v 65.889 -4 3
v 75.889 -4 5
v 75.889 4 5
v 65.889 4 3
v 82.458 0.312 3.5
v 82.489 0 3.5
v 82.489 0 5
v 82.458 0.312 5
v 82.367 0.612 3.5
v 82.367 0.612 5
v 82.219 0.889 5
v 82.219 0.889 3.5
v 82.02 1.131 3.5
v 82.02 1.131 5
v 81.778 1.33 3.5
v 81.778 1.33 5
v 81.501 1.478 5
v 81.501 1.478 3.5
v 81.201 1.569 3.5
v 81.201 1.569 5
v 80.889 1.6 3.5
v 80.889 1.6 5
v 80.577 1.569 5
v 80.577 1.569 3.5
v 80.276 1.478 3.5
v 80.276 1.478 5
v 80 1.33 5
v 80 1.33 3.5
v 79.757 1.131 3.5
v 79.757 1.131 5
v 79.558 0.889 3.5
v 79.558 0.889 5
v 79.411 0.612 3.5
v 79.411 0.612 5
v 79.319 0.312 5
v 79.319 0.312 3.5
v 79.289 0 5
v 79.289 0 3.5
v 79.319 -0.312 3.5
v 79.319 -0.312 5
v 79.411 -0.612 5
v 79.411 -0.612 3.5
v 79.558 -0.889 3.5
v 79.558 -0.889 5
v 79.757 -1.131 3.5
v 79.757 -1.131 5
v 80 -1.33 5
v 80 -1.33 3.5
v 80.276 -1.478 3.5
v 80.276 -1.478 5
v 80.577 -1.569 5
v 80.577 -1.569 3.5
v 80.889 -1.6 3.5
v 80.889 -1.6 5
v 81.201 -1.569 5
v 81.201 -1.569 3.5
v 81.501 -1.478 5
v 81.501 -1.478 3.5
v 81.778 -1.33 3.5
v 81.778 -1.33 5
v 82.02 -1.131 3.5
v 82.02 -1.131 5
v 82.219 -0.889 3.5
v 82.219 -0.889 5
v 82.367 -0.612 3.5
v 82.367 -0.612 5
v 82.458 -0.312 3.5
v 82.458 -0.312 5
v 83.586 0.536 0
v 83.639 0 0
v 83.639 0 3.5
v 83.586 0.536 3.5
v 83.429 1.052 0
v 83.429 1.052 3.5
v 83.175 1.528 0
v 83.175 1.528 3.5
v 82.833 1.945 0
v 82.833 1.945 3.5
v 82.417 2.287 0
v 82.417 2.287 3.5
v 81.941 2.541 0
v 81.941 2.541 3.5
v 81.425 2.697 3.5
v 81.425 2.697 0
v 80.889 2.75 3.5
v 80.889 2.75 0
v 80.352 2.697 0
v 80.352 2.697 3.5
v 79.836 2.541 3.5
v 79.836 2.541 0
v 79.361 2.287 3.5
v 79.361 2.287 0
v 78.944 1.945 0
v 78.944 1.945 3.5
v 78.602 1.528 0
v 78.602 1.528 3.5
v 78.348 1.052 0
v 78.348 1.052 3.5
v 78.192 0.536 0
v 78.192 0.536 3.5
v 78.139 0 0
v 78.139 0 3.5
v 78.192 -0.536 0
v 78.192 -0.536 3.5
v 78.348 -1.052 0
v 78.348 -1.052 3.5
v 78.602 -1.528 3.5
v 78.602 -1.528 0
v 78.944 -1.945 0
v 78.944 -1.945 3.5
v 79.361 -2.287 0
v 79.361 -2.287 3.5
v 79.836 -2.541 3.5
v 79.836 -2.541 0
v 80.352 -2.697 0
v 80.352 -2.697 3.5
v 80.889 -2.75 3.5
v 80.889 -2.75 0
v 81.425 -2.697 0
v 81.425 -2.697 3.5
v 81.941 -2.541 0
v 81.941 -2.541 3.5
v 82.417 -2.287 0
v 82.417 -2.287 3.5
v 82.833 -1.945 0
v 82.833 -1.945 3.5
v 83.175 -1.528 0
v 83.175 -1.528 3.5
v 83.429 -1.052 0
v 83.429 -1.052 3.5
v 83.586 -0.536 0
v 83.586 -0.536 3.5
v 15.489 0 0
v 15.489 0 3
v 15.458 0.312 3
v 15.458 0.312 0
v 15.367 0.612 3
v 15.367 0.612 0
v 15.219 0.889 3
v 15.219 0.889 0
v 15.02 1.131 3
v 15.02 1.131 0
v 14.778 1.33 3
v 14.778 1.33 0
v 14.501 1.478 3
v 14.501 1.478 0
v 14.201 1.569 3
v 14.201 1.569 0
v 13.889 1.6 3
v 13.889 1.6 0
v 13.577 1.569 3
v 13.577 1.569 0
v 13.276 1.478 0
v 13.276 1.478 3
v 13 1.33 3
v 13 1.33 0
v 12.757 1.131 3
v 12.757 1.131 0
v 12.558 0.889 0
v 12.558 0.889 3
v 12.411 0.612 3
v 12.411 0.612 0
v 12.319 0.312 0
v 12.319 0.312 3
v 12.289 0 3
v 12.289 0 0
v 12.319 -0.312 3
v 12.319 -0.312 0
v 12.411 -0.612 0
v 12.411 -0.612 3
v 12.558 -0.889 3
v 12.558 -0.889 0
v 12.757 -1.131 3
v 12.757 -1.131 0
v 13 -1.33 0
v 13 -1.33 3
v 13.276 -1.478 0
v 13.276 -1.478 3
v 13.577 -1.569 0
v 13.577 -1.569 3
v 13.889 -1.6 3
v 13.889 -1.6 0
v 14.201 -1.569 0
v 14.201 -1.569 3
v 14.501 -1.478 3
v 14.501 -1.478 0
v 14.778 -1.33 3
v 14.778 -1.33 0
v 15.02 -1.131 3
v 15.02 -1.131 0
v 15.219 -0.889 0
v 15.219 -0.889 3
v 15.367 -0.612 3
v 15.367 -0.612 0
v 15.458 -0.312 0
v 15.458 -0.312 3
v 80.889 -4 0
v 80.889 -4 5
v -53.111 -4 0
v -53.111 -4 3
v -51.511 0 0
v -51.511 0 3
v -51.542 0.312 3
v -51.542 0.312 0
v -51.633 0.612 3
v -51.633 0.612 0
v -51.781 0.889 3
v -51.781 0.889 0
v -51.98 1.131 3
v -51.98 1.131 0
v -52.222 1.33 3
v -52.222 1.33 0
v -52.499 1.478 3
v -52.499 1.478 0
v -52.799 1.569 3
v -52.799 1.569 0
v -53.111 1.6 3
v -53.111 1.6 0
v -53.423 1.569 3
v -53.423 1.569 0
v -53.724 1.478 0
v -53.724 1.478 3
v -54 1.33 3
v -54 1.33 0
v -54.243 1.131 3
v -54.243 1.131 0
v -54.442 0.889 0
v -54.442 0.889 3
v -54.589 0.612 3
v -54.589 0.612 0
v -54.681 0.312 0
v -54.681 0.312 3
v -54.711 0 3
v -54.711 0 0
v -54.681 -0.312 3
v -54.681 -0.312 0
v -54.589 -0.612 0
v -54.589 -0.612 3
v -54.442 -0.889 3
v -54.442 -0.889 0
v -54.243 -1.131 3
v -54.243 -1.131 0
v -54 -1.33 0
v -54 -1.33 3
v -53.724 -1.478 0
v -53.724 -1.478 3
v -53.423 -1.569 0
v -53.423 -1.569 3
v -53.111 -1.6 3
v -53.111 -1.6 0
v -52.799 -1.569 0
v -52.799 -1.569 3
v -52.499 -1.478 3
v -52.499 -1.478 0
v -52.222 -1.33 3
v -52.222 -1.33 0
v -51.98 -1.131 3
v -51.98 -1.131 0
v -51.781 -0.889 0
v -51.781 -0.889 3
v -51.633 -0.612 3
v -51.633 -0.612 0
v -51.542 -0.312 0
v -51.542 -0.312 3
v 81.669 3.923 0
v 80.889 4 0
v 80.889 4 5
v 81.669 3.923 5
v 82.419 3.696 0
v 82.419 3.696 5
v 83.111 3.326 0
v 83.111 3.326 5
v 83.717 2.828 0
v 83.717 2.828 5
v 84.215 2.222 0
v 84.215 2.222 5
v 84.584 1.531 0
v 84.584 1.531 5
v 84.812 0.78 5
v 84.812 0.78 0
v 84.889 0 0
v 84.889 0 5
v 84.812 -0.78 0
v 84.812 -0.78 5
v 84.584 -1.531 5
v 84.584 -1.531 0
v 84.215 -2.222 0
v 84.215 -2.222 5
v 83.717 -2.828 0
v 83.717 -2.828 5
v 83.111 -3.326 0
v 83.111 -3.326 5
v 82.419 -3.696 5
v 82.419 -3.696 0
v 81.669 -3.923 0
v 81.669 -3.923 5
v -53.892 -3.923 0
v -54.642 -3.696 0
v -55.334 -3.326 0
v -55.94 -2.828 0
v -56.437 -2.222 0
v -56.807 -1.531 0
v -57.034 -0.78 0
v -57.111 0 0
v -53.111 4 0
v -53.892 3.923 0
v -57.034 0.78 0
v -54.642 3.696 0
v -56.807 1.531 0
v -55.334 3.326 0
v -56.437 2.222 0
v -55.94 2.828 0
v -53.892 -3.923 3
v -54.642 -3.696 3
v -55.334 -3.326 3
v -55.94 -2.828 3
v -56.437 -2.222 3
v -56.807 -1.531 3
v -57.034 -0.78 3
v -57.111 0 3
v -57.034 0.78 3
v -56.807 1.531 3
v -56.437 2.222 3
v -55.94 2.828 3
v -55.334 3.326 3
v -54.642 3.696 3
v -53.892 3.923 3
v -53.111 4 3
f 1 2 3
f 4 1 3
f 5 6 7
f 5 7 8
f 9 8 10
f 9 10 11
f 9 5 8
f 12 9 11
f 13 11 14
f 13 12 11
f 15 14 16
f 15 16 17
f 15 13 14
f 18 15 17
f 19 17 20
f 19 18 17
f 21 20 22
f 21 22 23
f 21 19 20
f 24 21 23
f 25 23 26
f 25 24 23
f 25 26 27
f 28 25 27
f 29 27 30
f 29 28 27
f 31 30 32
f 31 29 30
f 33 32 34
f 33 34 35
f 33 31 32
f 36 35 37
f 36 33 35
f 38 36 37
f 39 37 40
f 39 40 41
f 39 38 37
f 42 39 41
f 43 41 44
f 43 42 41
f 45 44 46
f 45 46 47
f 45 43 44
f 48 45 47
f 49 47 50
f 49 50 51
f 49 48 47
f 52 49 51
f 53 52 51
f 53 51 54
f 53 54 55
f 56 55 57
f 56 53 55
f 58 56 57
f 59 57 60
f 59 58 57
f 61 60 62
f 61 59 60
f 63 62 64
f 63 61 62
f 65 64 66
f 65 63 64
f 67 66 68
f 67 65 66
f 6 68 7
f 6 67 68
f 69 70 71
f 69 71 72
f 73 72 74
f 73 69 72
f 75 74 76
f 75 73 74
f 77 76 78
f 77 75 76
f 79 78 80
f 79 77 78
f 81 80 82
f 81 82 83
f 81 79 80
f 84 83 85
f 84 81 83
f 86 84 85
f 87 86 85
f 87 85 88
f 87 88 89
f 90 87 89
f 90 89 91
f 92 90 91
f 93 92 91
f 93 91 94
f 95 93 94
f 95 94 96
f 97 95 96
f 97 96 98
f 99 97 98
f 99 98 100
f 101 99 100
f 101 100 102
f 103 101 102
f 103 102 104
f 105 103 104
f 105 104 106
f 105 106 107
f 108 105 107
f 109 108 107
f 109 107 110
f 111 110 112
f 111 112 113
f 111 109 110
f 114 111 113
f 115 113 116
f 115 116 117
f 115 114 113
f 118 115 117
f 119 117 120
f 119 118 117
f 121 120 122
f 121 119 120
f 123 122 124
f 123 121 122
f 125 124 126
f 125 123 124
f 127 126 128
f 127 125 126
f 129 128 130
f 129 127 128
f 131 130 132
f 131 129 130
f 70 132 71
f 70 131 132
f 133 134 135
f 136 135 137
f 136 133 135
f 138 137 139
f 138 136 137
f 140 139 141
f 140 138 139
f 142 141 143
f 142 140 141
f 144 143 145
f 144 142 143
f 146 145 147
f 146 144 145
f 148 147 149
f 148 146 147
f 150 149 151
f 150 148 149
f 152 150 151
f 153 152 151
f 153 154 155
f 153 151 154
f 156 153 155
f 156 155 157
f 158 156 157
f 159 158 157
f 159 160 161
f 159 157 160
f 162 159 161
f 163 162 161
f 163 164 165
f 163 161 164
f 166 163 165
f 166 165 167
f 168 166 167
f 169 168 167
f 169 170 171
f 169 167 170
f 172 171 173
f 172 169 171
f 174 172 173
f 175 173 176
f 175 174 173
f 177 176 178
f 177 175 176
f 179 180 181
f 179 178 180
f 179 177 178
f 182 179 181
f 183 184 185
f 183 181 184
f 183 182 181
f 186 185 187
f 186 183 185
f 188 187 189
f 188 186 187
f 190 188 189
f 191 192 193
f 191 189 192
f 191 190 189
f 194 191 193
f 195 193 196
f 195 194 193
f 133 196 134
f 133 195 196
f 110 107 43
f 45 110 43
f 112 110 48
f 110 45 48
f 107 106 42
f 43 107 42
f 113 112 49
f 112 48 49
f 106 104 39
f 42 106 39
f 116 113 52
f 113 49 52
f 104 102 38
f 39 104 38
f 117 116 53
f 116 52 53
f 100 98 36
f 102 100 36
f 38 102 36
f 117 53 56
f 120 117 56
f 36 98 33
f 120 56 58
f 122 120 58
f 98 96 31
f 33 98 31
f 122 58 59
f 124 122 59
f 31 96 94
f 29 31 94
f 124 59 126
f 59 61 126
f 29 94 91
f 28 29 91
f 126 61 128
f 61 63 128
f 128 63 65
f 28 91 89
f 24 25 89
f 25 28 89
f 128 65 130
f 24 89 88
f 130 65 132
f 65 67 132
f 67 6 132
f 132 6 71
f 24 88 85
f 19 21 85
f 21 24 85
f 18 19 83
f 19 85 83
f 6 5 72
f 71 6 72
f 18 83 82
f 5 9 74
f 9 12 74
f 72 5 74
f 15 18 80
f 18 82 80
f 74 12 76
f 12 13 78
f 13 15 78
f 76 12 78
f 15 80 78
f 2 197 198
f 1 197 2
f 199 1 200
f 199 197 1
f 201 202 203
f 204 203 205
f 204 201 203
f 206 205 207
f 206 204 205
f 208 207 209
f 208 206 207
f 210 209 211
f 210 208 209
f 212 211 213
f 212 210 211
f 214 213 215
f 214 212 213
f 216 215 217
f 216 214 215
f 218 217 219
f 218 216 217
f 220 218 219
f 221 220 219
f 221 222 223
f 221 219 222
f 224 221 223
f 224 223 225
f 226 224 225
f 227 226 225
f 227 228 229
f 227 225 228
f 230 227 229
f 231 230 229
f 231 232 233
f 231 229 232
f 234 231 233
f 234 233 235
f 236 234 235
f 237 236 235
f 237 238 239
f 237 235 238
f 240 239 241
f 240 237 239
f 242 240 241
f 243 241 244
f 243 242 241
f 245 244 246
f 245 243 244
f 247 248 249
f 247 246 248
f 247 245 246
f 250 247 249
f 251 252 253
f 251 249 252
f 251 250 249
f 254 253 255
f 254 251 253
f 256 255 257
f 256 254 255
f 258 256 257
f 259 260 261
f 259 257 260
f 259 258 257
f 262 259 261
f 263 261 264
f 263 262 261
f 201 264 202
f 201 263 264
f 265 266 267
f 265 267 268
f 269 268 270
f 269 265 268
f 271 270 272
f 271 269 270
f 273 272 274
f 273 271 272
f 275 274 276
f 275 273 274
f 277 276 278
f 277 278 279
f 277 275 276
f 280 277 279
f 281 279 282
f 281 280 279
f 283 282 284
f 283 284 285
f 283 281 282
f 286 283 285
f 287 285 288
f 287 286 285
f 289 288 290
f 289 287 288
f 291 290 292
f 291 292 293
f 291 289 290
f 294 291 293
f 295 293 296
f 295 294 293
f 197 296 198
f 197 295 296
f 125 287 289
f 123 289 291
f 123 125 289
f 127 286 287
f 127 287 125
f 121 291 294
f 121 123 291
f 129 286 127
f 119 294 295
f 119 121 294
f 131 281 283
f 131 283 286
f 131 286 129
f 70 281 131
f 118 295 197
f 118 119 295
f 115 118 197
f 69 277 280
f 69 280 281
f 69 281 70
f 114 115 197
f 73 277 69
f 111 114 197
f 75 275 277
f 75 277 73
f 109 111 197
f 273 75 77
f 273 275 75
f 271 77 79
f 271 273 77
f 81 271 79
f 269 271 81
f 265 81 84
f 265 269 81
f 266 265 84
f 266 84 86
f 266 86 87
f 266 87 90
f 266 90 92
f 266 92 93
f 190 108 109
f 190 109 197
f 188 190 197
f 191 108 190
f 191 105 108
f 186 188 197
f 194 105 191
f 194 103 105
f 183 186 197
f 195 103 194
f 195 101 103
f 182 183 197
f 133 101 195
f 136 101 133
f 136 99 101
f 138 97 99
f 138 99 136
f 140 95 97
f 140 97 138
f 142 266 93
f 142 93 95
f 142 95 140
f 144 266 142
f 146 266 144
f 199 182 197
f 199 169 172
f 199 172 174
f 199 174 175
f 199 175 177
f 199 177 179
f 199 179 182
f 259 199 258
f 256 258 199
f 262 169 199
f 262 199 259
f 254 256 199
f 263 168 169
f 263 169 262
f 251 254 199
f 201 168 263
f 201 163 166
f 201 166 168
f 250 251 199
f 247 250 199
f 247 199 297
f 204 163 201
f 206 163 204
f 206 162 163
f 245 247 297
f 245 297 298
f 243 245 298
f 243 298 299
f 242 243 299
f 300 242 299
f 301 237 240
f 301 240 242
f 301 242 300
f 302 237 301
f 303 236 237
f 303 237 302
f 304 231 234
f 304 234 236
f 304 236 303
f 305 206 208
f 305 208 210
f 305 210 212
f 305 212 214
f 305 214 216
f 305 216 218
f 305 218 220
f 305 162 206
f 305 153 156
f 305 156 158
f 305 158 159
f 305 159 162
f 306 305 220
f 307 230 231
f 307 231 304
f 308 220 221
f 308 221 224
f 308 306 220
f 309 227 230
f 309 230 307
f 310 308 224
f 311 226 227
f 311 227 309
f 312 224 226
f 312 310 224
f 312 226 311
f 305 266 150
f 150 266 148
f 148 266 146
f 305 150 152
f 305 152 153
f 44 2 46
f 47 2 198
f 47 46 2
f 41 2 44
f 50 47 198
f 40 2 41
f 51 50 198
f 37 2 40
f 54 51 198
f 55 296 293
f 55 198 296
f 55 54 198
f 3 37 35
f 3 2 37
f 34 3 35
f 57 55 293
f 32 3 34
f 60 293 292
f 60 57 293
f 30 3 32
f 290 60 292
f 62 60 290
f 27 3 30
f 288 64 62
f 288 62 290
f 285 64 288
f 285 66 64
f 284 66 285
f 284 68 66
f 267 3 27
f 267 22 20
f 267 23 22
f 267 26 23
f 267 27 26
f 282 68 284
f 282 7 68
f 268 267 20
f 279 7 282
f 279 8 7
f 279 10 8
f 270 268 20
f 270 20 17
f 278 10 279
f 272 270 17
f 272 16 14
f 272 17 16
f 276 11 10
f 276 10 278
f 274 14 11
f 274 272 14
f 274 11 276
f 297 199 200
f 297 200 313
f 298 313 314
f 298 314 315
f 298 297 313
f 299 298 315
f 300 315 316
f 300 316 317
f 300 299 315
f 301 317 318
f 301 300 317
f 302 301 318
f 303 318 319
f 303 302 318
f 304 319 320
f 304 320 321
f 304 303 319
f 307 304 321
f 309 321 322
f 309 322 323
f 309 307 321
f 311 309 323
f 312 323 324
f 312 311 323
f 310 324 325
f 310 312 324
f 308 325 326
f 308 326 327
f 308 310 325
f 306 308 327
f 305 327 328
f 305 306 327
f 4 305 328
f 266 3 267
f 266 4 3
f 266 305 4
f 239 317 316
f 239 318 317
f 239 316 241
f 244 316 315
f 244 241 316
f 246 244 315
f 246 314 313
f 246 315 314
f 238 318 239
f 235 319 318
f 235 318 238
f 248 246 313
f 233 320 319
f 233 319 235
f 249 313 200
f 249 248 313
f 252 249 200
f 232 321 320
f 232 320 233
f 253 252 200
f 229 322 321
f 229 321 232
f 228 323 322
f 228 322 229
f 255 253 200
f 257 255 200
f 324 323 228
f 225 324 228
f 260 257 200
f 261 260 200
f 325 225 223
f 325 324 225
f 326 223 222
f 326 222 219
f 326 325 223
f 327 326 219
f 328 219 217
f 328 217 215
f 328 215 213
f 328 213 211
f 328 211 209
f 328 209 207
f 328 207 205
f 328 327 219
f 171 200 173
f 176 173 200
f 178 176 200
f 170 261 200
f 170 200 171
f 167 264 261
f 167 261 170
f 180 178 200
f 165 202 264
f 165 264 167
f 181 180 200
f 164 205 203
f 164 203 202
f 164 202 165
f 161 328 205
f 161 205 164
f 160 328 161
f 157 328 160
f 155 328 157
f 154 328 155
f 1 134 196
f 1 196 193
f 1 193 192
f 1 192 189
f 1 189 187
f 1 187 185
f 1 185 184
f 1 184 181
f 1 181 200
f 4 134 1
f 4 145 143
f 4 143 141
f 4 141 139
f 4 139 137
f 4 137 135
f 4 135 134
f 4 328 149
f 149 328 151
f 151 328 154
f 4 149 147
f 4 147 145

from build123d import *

# Parameters (mm, degrees)
SKETCH_1_R          = 2.75
SKETCH_1_R_2        = 1.6
EXTRUDE_1_DEPTH     = 5
EXTRUDE_START       = -1.5
SKETCH_2_R          = 2.75
SKETCH_2_R_2        = 1.6
EXTRUDE_2_DEPTH     = 1.5
SKETCH_3_W          = 127
SKETCH_3_H          = 8
CUT_EXTRUDE_1_DEPTH = 2
CHAMFER_1_SIZE2     = 2
CHAMFER_1_SIZE      = 10


with BuildPart() as part:
    # 草圖1 → 填料-伸長1 (new body)
    with BuildSketch(Plane.XY):
        with BuildLine():
            Line((-53.111291809, 4), (80.888708191, 4))
            ThreePointArc((80.888708191, 4), (84.888708191, 0), (80.888708191, -4))
            Line((80.888708191, -4), (-53.111291809, -4))
            ThreePointArc((-53.111291809, -4), (-57.111291809, 0), (-53.111291809, 4))
        make_face()
        with Locations((80.888708191, 0)):
            Circle(SKETCH_1_R, mode=Mode.SUBTRACT)
        with Locations((-53.111291809, 0)):
            Circle(SKETCH_1_R_2, mode=Mode.SUBTRACT)
        with Locations((13.888708191, 0)):
            Circle(SKETCH_1_R_2, mode=Mode.SUBTRACT)
    extrude(amount=EXTRUDE_1_DEPTH)

    # 草圖2 → 填料-伸長2 (add)
    with BuildSketch(Plane.XY.offset(5).offset(EXTRUDE_START)):
        with Locations((80.888708191, 0)):
            Circle(SKETCH_2_R)
        with Locations((80.888708191, 0)):
            Circle(SKETCH_2_R_2, mode=Mode.SUBTRACT)
    extrude(amount=EXTRUDE_2_DEPTH)

    # 草圖3 → 除料-伸長1 (cut)
    with BuildSketch(Plane.XY.offset(5)):
        with Locations((2.388708191, 0)):
            Rectangle(SKETCH_3_W, SKETCH_3_H)
    extrude(amount=-CUT_EXTRUDE_1_DEPTH, mode=Mode.SUBTRACT)

    # 導角1
    chamfer_1_edges = [part.edges().sort_by_distance(p)[0] for p in [
        (65.888708191, 0, 5),
    ]]
    chamfer_1_side = [part.faces().sort_by_distance(p)[0] for p in [
        (65.928708191, 0, 5),
    ]]
    chamfer(chamfer_1_edges, length=CHAMFER_1_SIZE - 0.0001, length2=CHAMFER_1_SIZE2 - 0.0001, reference=chamfer_1_side[0])  # a hair under: the kernel refuses the full size


solid = part.part
